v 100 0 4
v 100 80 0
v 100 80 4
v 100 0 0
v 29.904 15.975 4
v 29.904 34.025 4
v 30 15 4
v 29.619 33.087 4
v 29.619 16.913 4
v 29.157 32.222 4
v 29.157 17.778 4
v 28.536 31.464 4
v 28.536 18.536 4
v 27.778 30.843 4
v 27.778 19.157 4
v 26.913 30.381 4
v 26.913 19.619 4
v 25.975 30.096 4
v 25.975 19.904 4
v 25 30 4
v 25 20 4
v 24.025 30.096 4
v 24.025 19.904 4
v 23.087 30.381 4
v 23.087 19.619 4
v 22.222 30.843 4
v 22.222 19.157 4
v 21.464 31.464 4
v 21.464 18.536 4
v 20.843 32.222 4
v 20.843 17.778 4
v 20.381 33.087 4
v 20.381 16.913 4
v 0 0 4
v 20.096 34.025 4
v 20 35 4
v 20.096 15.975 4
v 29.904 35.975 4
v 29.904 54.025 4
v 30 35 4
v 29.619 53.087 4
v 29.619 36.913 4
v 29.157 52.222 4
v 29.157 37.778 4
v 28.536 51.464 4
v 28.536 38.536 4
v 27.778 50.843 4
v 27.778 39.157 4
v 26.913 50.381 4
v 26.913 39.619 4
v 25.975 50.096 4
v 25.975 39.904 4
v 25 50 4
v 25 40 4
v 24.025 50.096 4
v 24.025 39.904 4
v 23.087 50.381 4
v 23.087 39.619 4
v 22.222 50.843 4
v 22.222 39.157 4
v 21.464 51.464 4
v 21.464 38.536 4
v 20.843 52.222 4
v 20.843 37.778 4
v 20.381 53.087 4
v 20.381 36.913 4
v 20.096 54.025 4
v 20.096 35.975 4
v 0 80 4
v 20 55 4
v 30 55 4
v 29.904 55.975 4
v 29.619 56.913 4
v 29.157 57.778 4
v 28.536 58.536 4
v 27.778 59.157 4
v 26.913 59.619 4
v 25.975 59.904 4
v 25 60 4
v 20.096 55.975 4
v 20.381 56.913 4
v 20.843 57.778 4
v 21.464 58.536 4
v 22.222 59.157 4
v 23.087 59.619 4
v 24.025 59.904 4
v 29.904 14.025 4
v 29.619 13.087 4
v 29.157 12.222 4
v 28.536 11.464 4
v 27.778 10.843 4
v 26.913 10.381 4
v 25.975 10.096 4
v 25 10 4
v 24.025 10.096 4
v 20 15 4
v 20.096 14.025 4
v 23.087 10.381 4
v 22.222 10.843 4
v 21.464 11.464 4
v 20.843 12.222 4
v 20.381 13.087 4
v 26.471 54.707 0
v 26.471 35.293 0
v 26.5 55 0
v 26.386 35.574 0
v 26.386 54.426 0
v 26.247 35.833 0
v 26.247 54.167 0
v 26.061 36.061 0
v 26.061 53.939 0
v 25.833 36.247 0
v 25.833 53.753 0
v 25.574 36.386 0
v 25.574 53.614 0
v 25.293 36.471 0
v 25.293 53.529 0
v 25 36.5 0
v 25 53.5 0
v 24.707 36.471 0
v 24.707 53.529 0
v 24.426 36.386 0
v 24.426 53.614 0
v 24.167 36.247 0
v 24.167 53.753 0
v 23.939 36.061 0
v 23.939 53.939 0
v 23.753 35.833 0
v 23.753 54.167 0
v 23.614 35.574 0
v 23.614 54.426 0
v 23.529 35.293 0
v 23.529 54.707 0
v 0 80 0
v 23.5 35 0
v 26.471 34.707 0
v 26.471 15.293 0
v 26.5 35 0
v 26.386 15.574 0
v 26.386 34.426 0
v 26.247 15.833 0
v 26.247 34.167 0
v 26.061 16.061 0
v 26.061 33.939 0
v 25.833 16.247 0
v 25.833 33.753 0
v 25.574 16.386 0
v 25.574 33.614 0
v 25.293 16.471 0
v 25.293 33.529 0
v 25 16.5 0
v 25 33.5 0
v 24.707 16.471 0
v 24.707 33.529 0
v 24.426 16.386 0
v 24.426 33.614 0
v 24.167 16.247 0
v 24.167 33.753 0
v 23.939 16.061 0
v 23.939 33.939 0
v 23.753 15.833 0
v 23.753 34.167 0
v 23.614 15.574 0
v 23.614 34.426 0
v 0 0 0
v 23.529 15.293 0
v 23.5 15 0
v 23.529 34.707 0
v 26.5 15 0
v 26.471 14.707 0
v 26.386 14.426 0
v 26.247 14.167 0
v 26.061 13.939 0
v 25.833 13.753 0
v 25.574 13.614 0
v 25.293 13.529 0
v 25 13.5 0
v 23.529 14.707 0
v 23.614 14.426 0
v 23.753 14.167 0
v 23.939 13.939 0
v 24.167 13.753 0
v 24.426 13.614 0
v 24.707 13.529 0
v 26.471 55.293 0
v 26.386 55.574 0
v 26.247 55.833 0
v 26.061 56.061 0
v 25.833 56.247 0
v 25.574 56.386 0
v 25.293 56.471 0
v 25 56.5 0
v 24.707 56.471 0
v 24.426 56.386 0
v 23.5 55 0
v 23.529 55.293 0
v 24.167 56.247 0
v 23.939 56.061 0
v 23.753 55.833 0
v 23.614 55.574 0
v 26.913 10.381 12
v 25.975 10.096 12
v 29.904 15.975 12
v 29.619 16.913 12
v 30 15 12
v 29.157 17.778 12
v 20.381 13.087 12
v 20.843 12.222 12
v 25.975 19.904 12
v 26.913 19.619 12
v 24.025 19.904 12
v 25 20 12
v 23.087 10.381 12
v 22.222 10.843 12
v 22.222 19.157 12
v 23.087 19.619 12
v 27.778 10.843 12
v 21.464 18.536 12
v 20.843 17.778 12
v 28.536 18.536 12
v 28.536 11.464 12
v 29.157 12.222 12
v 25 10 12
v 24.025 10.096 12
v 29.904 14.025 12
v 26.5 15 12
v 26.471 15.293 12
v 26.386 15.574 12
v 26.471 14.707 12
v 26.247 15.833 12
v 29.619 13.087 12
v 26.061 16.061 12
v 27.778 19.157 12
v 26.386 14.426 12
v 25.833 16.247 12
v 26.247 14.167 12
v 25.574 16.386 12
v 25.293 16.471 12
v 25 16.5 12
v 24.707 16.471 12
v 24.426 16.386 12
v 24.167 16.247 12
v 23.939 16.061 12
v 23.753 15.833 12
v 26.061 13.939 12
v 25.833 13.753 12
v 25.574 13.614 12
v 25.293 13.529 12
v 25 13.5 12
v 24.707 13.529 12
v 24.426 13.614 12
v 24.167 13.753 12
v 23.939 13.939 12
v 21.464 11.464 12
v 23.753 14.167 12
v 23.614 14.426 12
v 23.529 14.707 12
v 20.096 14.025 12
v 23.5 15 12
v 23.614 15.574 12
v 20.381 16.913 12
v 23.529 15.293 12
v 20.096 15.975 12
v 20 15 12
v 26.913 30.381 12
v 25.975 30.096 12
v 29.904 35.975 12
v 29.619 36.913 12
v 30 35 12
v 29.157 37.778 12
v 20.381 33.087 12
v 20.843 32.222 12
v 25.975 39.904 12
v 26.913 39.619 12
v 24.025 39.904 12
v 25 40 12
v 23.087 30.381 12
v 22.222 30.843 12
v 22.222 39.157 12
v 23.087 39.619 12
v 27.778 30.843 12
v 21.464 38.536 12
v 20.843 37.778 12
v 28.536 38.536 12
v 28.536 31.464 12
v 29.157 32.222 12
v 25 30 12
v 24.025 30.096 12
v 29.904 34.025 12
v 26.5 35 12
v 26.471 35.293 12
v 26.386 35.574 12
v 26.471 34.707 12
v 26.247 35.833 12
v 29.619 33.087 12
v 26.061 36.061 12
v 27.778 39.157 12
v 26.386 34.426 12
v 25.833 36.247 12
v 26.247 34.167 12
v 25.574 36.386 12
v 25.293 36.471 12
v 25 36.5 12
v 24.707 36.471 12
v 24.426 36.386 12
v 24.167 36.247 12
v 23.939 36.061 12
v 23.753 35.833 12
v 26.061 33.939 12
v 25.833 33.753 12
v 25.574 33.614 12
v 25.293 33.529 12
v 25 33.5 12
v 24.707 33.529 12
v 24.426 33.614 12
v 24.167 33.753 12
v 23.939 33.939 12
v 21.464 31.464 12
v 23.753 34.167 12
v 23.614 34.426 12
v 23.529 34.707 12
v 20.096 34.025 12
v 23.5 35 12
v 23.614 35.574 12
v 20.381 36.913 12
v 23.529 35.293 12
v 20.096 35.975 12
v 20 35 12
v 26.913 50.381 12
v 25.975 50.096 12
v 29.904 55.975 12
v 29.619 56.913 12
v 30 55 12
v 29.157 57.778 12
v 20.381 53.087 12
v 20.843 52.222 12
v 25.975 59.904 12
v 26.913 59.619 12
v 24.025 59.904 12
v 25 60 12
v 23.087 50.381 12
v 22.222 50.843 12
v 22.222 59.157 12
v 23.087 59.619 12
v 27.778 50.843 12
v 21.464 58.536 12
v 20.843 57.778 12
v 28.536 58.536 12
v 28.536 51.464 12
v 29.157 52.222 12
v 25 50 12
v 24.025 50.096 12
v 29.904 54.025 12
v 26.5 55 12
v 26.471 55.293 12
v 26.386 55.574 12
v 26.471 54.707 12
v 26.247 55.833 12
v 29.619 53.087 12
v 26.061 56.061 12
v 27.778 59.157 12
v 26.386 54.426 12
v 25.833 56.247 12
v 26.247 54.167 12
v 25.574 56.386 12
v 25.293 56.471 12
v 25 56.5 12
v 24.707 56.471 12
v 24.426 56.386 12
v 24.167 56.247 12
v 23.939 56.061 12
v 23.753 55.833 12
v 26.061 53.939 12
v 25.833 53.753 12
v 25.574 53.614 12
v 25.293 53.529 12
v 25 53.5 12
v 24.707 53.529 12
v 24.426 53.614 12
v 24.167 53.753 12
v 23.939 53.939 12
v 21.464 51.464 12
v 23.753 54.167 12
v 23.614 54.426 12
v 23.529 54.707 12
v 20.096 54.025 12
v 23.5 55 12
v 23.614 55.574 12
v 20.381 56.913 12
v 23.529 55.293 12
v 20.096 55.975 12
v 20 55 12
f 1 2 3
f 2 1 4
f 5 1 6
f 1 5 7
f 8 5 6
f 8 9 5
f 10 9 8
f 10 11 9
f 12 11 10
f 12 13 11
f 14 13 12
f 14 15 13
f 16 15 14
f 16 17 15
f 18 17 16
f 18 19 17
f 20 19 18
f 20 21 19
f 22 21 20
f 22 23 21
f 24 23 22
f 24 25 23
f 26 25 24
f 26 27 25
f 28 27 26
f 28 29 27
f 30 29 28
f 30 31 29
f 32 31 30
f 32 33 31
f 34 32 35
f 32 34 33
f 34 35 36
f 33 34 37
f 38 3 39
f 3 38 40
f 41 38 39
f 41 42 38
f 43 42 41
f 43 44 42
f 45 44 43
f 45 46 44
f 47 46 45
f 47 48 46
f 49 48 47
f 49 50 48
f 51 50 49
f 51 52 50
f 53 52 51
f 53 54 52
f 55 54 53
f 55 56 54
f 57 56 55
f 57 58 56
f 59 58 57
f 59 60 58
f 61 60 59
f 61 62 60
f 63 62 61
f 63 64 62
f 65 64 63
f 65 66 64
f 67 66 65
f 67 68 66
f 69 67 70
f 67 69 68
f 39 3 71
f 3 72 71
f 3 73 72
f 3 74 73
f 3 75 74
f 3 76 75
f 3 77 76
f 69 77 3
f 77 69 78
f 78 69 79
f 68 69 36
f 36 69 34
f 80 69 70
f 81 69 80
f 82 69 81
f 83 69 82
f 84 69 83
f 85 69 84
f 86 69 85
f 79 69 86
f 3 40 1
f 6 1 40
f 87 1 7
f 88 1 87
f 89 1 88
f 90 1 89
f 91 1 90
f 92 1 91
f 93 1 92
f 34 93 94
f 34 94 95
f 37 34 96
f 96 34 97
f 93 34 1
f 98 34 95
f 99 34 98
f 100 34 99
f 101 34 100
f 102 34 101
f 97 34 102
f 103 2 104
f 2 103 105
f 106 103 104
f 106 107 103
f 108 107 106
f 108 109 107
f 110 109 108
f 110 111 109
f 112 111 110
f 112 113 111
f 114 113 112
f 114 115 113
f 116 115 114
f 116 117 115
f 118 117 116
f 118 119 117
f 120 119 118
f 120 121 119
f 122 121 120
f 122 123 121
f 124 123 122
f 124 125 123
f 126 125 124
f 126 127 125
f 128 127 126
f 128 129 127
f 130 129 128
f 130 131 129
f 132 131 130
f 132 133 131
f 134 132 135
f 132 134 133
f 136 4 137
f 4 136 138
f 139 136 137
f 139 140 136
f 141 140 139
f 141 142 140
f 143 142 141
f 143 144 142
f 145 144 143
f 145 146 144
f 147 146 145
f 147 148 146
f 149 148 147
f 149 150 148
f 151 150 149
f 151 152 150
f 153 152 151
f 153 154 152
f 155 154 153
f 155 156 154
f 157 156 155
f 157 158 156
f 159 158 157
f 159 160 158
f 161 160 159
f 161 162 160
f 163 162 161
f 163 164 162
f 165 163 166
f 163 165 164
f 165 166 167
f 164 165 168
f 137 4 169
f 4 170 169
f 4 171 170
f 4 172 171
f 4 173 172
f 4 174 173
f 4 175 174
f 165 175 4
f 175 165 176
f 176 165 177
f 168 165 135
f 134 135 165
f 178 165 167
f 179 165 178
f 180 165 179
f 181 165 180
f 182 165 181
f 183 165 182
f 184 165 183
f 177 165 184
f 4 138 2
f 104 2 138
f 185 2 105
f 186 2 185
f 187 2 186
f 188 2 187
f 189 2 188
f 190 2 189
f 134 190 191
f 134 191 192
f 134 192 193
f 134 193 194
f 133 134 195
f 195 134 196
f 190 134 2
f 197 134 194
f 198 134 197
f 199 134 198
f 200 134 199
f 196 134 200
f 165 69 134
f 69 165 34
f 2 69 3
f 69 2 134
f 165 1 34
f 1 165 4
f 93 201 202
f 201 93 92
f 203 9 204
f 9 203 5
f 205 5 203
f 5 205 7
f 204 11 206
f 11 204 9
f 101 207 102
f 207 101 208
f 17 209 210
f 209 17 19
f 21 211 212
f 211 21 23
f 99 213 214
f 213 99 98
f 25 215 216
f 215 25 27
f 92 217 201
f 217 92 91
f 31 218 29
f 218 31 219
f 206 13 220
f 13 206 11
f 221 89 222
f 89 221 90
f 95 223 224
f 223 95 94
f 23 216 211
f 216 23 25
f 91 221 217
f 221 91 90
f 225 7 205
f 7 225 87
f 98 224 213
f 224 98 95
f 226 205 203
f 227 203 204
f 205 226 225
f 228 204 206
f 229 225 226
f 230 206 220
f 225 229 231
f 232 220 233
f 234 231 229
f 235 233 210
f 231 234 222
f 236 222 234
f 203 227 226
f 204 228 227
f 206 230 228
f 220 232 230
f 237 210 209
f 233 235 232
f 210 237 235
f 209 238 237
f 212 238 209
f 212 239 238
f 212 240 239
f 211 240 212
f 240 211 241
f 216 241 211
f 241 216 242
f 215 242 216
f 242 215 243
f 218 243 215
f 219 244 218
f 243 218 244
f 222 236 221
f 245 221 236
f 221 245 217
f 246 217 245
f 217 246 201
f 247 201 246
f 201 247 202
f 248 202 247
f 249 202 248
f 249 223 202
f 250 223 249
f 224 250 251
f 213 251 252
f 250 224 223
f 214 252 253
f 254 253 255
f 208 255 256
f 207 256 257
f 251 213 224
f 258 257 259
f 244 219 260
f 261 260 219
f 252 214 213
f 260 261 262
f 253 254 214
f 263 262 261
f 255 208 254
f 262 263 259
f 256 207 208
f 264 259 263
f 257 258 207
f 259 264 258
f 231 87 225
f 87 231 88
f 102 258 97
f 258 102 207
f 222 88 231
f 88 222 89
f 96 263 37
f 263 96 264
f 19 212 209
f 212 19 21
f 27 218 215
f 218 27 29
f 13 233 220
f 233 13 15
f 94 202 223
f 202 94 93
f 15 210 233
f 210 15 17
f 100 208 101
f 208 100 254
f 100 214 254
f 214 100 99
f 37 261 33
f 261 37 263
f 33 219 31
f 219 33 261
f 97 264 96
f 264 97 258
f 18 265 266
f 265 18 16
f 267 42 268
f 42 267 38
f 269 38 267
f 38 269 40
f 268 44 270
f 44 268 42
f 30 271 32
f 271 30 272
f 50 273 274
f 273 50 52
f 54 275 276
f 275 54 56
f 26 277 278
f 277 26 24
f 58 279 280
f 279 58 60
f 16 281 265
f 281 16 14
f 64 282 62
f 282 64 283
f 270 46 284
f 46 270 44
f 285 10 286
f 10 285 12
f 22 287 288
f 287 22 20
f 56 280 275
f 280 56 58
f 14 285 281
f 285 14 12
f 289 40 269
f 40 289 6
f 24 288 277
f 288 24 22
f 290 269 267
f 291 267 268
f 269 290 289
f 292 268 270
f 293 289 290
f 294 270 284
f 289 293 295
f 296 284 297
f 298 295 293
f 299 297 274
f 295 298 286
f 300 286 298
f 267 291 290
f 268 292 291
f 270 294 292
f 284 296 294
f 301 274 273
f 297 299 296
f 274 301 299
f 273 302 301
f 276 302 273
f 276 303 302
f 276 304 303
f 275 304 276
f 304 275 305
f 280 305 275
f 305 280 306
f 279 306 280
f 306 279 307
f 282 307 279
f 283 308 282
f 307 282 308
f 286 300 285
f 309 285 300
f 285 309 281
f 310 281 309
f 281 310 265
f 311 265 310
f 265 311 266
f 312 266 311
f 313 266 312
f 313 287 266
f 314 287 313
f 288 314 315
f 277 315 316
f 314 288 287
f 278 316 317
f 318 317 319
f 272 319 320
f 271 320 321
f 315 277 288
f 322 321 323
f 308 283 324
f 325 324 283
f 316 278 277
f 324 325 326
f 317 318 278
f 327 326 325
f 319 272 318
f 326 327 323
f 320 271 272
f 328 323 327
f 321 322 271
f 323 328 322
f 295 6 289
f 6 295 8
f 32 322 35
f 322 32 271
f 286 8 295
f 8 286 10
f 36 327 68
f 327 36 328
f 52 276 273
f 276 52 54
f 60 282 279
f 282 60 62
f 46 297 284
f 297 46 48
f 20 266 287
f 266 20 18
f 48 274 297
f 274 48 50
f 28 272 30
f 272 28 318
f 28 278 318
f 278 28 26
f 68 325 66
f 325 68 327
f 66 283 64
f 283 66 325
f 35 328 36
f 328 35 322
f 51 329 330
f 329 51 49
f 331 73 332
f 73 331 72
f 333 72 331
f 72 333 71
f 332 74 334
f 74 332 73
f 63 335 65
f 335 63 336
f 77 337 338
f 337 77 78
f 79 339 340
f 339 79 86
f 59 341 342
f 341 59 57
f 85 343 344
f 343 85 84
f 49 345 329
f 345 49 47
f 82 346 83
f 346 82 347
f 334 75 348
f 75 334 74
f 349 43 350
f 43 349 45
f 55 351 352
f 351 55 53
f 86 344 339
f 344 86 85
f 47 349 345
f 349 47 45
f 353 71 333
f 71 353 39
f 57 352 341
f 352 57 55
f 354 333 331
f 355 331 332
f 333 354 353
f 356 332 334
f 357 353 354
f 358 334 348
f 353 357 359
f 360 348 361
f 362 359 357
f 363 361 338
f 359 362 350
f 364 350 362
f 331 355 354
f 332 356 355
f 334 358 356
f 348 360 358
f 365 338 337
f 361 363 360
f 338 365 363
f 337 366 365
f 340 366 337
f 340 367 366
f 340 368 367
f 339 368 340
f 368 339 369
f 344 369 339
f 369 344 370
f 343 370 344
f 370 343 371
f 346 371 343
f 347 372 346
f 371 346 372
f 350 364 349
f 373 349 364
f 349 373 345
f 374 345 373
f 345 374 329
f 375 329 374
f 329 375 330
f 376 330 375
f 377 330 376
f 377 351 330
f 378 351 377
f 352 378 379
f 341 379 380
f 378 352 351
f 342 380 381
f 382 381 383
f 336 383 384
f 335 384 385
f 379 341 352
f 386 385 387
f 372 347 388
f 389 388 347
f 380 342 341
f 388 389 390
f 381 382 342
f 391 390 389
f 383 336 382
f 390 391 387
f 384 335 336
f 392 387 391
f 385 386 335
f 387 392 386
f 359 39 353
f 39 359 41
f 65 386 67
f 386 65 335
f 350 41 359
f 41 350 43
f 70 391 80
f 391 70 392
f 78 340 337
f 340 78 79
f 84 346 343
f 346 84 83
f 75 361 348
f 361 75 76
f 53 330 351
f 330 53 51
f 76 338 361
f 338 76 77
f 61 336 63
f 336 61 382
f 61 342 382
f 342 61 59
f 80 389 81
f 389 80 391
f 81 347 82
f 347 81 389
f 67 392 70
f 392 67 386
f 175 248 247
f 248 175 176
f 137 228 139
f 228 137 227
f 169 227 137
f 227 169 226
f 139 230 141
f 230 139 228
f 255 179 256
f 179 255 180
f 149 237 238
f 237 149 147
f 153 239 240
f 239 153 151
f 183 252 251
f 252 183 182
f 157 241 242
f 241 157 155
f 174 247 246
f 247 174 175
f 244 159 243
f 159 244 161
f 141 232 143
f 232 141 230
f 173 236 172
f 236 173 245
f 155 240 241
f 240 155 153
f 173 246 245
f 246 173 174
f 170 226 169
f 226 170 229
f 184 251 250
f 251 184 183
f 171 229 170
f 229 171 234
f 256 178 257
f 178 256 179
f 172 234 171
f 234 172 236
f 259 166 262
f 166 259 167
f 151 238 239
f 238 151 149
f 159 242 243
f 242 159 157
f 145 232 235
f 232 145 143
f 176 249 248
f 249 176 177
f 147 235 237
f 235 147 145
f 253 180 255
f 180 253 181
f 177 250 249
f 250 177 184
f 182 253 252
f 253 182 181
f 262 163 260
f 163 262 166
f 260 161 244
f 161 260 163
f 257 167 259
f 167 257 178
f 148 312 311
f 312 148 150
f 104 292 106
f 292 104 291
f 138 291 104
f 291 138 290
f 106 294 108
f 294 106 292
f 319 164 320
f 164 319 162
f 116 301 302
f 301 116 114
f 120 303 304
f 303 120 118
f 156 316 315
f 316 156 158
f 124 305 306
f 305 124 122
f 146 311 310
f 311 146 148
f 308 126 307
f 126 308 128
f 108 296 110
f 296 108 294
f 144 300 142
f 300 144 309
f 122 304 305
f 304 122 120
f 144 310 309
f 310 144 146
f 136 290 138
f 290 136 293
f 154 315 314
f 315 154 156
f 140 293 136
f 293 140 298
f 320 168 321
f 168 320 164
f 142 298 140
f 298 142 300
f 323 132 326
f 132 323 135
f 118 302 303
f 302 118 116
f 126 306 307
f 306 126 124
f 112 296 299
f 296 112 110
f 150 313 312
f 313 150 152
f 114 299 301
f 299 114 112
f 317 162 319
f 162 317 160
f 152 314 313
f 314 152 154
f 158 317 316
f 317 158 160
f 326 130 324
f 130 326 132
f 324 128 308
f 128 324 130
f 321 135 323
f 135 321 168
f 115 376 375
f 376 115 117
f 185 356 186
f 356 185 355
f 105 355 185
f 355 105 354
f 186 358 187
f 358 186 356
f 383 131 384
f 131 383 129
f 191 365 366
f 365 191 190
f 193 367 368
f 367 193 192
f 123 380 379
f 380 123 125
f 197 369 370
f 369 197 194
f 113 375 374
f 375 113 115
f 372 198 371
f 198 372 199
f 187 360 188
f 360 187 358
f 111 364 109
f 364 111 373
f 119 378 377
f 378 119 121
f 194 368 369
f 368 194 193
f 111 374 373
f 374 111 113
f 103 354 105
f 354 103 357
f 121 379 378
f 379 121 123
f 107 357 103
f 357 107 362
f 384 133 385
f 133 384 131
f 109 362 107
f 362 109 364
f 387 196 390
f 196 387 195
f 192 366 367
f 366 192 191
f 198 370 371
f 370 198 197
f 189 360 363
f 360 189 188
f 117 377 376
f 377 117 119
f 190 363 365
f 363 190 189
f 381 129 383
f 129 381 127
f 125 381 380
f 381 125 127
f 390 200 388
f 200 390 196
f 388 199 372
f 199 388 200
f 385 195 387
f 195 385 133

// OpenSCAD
$fn = 32;

// ----------------------------------------------------------------------
// Boss field: plate with bosses at given coordinates
// ----------------------------------------------------------------------

// --- parameters (mm) ---
plate_l = 100;            // plate length, X
plate_w = 80;             // plate width, Y
plate_t = 4;              // plate thickness, Z
boss_d = 10;              // boss diameter
boss_h = 8;               // boss height above the plate
bore_d = 3;               // boss bore

total_h = plate_t + boss_h;  // overall height

difference() {
  union() {
    cube([plate_l, plate_w, plate_t]);
    translate([25, 15, plate_t]) cylinder(h = boss_h, d = boss_d);
    translate([25, 35, plate_t]) cylinder(h = boss_h, d = boss_d);
    translate([25, 55, plate_t]) cylinder(h = boss_h, d = boss_d);
  }
  translate([25, 15, -1]) cylinder(h = total_h + 2, d = bore_d);
  translate([25, 35, -1]) cylinder(h = total_h + 2, d = bore_d);
  translate([25, 55, -1]) cylinder(h = total_h + 2, d = bore_d);
}
